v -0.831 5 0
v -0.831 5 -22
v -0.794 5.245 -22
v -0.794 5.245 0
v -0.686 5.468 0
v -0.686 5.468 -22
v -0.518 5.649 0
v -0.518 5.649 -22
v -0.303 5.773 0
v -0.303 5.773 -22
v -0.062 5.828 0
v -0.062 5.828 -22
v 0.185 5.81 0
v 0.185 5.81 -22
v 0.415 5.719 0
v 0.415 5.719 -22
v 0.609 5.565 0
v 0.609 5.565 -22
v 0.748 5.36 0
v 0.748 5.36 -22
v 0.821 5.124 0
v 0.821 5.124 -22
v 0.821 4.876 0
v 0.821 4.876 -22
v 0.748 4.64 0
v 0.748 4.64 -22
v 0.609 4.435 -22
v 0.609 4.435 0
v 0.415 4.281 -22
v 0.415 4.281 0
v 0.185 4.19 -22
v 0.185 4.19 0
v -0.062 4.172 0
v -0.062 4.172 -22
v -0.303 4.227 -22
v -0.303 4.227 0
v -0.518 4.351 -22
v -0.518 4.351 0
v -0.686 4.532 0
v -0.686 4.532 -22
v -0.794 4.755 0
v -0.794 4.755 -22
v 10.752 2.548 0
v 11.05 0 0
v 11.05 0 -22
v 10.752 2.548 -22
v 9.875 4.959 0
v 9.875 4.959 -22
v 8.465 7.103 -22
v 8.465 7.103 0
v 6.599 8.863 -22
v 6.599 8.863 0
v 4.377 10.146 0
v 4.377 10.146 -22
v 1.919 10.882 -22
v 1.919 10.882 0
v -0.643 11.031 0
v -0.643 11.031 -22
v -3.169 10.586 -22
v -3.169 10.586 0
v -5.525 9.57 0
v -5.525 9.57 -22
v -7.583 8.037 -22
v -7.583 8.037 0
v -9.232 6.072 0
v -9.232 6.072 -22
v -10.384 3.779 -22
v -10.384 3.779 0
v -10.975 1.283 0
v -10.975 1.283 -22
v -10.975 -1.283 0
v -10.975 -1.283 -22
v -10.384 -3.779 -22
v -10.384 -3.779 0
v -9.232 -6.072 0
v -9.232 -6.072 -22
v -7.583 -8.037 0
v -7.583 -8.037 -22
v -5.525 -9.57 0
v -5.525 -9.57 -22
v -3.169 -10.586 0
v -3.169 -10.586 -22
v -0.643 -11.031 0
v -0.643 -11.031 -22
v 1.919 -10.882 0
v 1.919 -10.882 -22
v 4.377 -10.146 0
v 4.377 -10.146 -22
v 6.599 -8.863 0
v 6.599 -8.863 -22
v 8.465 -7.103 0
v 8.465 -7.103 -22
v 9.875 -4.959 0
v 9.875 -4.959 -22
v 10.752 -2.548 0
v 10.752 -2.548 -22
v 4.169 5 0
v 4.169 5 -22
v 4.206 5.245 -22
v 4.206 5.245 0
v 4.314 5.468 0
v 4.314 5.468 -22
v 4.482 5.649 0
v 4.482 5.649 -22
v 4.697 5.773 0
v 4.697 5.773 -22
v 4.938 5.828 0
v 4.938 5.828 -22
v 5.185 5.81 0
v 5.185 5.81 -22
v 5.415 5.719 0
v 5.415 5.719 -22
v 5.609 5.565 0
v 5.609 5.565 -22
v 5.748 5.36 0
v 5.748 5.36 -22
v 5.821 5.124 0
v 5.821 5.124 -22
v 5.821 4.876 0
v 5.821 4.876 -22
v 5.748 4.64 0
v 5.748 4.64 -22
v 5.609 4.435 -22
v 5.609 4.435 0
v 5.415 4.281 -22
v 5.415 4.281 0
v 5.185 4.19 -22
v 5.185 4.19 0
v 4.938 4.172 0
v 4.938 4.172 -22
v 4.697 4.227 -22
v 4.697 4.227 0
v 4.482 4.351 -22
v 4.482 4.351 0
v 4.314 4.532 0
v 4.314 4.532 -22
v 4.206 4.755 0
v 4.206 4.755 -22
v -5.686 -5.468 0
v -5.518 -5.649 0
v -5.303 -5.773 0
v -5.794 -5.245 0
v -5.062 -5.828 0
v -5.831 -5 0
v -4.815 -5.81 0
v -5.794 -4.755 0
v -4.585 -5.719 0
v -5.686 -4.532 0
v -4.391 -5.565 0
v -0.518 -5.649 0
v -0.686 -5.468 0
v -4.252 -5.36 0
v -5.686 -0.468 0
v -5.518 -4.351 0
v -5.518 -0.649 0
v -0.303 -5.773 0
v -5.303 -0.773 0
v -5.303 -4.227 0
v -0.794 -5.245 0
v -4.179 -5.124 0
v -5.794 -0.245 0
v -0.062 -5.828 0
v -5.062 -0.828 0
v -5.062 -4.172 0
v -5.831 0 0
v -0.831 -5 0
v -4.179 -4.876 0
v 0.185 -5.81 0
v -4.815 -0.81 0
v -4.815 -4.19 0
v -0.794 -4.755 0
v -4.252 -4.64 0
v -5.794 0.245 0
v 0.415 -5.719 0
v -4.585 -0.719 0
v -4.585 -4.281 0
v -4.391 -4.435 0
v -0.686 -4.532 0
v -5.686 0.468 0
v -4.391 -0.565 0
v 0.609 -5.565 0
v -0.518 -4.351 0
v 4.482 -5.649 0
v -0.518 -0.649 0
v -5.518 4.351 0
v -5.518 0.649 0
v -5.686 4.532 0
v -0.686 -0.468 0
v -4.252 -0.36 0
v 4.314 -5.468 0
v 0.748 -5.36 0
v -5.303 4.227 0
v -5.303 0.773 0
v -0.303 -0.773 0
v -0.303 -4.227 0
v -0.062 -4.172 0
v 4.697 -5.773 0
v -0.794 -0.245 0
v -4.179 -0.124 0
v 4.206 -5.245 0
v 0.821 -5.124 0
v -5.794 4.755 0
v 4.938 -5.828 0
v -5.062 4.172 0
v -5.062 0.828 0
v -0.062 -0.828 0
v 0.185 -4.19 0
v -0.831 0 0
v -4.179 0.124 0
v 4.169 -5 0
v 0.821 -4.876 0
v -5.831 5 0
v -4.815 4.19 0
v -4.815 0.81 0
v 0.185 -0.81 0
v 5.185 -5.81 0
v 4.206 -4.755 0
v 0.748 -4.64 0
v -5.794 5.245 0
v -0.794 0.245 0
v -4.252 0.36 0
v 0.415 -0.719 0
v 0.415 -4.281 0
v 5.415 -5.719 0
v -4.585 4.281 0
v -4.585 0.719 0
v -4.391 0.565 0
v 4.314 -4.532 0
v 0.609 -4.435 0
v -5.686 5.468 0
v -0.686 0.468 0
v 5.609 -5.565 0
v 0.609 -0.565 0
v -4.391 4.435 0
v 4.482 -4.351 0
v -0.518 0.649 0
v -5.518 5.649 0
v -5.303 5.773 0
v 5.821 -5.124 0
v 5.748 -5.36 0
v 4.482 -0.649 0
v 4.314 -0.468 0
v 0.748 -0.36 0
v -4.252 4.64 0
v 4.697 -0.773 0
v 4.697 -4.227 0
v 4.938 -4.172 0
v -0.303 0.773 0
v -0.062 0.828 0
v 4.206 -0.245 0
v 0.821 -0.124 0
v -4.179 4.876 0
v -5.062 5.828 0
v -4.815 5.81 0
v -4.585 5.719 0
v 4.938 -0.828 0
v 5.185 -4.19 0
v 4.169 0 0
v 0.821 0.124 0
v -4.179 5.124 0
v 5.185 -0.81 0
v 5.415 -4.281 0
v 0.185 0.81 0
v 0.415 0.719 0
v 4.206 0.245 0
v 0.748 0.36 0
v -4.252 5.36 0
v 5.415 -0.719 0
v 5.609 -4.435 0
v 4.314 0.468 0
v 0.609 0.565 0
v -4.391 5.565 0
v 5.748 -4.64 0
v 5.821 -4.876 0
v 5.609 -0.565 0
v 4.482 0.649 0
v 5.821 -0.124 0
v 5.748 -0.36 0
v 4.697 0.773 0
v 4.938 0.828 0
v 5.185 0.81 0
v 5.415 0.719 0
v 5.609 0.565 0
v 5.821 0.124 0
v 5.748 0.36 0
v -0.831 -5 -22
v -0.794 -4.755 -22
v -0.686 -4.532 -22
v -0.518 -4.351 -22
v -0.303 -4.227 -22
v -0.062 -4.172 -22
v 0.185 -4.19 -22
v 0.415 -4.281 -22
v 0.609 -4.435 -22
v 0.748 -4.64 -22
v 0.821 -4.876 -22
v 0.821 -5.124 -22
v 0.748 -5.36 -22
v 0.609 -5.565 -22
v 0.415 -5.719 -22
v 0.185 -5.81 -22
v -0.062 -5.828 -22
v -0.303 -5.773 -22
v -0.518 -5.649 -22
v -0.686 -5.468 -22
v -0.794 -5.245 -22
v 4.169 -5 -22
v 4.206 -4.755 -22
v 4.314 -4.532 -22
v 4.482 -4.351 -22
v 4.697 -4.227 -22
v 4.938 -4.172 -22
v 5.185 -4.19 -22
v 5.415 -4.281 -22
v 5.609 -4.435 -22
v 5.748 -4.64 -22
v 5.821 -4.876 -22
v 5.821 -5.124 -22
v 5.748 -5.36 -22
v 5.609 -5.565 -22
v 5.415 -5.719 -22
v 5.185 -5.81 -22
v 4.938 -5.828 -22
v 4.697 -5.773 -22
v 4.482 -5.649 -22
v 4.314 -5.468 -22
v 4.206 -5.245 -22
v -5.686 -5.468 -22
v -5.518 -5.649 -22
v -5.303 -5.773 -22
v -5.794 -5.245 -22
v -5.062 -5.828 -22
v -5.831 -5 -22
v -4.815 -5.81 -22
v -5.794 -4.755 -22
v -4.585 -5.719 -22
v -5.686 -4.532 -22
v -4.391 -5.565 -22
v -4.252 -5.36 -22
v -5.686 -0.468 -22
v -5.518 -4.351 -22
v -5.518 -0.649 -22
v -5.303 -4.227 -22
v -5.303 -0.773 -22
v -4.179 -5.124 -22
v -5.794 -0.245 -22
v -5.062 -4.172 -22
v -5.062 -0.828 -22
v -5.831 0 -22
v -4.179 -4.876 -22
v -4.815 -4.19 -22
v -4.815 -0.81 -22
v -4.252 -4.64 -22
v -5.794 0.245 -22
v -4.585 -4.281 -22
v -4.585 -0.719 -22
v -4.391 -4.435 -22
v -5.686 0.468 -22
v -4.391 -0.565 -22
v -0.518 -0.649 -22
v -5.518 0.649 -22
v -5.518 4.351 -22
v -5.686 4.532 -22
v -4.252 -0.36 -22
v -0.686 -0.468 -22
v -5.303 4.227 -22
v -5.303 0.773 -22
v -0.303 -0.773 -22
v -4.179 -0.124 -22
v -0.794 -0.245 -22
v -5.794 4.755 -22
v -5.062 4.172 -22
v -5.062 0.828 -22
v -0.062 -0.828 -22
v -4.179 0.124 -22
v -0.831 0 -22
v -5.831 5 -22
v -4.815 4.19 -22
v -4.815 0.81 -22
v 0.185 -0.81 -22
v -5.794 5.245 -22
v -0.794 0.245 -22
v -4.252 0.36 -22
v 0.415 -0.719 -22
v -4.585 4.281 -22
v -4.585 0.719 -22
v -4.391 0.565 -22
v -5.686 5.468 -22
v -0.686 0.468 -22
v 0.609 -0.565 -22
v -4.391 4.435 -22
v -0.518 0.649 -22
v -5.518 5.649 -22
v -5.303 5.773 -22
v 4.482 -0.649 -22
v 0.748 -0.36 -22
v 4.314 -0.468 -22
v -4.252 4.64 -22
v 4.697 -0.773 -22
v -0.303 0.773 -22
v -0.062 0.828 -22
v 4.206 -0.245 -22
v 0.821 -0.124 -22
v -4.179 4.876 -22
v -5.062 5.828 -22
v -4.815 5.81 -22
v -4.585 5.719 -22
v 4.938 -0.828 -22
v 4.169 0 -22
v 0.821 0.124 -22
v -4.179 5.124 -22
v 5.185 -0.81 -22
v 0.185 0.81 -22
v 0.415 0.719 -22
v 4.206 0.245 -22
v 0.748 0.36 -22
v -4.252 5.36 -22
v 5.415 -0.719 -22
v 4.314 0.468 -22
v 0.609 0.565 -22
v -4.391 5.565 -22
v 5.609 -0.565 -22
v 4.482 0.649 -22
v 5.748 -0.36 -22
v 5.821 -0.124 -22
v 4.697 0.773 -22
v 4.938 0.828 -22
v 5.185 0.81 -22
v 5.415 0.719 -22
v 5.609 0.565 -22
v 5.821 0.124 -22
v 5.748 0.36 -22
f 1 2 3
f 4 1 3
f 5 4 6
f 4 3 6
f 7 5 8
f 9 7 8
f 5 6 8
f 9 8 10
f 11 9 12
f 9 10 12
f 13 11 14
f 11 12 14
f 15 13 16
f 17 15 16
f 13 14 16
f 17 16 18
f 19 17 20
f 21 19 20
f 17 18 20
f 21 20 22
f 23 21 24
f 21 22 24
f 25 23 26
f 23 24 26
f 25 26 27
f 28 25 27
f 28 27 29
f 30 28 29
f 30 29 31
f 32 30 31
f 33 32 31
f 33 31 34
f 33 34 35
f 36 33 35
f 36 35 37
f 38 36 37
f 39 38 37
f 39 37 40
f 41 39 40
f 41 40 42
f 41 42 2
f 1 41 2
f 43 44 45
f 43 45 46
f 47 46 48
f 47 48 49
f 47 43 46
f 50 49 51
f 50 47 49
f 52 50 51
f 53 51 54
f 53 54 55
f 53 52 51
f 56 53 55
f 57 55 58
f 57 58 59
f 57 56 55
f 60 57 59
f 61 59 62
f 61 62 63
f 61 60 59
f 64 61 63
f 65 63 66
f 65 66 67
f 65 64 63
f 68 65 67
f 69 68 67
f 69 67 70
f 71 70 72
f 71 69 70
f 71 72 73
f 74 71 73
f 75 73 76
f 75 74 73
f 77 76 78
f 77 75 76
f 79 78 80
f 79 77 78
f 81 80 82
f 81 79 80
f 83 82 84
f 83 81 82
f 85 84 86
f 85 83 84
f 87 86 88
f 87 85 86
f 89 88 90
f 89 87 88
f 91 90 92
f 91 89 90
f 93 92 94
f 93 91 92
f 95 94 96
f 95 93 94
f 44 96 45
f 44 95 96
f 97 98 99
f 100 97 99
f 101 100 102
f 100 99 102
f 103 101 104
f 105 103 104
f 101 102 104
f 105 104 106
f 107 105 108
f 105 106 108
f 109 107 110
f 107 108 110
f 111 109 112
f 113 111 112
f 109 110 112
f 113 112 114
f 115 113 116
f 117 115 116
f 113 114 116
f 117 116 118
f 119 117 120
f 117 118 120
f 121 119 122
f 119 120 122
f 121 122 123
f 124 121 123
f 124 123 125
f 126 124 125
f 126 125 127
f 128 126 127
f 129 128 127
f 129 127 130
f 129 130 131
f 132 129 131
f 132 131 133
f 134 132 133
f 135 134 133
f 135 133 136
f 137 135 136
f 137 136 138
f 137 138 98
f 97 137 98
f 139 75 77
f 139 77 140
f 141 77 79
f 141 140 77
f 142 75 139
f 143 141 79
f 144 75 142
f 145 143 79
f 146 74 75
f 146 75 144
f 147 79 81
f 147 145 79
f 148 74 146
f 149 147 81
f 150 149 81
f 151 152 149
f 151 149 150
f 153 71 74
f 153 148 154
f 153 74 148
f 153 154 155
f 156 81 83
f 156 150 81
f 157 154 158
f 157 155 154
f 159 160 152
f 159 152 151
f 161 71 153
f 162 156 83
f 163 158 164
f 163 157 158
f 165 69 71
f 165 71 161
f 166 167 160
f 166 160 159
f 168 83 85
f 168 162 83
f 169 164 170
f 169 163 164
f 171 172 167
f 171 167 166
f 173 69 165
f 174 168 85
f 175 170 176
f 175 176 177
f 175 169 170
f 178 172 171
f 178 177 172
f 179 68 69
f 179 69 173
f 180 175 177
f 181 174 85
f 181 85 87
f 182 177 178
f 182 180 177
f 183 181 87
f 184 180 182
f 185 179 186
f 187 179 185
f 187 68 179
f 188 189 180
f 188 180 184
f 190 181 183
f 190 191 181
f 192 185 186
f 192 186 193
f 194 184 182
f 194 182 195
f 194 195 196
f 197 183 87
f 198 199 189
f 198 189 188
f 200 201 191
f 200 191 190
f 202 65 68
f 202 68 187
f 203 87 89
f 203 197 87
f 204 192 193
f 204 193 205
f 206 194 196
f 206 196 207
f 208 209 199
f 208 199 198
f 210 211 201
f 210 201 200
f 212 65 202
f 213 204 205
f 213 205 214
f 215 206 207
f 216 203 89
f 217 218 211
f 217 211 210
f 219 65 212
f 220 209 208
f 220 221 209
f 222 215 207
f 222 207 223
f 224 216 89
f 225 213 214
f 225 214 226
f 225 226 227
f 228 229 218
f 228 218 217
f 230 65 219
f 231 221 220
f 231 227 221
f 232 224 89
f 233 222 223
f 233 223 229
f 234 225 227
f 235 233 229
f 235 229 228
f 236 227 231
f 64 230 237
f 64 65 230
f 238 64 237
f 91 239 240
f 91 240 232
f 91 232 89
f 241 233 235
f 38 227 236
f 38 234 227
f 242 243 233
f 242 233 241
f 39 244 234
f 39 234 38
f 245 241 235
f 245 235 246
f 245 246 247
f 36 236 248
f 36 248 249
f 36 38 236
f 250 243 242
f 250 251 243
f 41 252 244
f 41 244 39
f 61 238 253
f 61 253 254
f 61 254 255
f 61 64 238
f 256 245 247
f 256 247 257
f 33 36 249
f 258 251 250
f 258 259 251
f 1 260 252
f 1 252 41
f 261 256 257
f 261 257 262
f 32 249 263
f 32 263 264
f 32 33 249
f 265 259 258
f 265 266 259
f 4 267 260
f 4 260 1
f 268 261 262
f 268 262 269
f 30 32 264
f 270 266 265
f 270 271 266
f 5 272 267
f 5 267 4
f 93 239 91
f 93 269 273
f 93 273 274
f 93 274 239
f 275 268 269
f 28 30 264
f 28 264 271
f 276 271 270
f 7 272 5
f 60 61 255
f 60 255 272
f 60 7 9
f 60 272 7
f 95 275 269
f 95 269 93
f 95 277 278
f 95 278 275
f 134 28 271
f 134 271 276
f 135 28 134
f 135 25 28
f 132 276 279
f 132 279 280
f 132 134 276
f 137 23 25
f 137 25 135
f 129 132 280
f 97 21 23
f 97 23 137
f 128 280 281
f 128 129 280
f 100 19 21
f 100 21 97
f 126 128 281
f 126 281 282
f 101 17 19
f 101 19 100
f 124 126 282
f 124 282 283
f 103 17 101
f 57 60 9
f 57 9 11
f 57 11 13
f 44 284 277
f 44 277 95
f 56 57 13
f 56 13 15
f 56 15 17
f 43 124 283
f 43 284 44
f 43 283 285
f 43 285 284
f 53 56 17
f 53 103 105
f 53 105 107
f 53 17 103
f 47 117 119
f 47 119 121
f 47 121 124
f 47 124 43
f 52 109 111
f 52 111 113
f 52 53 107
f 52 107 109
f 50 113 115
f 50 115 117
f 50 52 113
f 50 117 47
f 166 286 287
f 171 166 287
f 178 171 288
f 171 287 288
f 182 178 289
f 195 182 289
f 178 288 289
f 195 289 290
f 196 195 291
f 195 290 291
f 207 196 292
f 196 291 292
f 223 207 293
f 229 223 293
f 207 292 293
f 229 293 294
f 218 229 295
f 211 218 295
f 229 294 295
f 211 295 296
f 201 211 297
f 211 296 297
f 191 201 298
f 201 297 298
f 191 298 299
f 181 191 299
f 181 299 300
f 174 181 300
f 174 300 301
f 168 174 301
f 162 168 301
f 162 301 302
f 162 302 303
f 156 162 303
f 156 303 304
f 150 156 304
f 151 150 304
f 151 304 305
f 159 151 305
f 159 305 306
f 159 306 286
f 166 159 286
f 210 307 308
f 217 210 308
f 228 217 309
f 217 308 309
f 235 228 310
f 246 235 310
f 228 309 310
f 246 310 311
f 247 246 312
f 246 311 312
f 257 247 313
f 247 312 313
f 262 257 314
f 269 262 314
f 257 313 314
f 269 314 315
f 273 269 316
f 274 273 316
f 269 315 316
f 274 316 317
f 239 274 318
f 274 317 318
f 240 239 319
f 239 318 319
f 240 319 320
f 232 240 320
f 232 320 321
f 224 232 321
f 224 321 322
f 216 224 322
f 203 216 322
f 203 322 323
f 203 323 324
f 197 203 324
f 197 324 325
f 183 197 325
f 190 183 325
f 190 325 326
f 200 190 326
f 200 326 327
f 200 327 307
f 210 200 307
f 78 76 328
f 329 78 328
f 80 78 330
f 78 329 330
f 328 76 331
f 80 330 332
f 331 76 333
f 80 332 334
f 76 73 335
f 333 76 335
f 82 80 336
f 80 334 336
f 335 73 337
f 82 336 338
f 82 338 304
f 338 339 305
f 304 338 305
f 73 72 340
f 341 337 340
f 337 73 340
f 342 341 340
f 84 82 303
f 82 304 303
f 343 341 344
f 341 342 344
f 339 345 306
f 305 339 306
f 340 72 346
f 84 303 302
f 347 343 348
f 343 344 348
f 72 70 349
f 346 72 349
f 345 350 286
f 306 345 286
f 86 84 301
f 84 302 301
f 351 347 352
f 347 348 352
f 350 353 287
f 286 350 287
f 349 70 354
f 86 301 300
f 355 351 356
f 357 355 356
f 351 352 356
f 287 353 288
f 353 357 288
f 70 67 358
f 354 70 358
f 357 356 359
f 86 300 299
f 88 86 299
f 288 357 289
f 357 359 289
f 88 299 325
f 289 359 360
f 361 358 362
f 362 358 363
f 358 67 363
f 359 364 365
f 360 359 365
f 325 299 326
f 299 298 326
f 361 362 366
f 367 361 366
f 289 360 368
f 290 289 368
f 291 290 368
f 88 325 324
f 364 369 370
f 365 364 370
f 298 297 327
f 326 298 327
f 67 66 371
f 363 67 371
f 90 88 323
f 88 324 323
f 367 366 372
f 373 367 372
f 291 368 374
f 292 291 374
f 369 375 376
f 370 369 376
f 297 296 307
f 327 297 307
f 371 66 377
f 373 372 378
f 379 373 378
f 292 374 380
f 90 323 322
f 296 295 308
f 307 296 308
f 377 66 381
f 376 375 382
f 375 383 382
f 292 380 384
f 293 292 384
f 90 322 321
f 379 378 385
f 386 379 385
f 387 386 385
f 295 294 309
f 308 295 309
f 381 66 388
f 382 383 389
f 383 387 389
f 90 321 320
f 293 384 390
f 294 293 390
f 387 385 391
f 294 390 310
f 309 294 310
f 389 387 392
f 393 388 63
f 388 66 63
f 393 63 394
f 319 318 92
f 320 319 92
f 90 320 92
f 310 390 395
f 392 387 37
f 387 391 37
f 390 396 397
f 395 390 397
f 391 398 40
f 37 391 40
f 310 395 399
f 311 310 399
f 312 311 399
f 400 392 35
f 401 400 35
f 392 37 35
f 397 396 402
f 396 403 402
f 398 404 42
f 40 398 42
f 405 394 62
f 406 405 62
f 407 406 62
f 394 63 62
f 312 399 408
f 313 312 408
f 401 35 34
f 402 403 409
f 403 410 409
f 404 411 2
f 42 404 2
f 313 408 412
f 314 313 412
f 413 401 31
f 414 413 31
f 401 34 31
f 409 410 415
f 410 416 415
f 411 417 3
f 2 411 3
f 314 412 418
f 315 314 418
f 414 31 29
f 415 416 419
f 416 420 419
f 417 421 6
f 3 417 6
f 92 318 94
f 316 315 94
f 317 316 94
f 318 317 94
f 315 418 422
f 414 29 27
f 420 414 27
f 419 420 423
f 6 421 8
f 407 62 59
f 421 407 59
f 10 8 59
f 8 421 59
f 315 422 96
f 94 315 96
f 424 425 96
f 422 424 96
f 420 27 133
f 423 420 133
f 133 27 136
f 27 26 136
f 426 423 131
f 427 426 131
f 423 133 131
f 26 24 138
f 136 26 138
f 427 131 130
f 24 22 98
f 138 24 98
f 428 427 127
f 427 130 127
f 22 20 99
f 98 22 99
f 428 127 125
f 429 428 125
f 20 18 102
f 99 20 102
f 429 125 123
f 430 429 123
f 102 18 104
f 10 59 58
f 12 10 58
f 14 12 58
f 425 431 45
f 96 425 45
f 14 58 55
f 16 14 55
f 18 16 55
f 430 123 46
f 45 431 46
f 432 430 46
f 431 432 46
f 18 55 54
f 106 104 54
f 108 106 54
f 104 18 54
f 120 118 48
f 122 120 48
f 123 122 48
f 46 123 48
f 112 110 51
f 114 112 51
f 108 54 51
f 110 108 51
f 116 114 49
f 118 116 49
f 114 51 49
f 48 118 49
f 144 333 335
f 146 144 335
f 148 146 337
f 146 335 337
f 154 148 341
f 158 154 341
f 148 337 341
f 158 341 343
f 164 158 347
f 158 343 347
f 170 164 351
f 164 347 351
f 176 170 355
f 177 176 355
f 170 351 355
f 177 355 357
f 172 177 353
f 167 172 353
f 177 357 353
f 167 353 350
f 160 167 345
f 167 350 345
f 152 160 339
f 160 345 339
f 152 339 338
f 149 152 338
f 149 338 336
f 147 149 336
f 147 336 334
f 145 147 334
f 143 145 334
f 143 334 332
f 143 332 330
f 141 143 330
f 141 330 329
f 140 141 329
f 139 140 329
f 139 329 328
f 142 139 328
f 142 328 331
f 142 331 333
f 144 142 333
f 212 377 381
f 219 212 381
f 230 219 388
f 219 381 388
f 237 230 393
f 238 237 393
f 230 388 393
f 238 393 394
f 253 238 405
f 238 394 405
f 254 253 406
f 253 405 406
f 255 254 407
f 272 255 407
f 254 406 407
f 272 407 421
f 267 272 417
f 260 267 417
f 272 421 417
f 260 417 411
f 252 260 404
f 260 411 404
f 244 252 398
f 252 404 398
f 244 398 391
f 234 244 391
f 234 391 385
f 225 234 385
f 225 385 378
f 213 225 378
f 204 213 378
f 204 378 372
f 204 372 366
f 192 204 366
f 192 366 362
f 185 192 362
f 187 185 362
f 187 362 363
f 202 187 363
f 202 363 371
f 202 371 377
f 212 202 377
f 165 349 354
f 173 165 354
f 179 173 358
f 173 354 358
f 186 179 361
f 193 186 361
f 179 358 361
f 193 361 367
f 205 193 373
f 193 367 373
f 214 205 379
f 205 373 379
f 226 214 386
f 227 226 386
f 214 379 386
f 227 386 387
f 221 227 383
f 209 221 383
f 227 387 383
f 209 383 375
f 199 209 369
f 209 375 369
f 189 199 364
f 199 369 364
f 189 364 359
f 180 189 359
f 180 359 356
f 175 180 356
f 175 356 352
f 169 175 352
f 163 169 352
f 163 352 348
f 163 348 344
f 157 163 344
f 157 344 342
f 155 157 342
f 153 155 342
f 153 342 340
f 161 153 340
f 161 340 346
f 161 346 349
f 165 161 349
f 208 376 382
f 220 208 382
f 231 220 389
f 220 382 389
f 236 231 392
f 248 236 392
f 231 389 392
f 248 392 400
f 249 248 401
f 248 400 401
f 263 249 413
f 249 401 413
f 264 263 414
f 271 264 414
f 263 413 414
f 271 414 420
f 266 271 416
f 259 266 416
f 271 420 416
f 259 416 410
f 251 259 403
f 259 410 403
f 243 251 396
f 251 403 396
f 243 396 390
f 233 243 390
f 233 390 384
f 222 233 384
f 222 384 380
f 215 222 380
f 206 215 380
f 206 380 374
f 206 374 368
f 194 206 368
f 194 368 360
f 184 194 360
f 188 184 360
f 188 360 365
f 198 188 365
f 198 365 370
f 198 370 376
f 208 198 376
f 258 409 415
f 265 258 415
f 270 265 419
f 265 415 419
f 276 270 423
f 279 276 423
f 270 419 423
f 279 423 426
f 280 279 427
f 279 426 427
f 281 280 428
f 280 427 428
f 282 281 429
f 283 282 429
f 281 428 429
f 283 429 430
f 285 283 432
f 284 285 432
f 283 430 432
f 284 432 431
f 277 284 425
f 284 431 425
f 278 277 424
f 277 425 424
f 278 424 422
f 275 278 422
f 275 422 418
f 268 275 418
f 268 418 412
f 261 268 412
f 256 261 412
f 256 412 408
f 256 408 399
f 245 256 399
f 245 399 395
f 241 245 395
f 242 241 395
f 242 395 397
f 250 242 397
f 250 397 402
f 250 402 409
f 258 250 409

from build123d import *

# Parameters (mm, degrees)
F0_R     = 11.05
F1_DEPTH = 22
F2_D     = 1.66116


with BuildPart() as f1:
    # F0 (on Top) → F1 (new body)
    with BuildSketch(Plane.XY):
        Circle(F0_R)
    extrude(amount=-F1_DEPTH)

    # F2 (through all)
    with Locations(Plane.XY):
        with Locations((0, 5), (-5, 5), (-5, 0), (-5, -5), (0, -5), (5, -5), (5, 0), (5, 5), (0, 0)):
            Hole(F2_D / 2)


solid = f1.part
